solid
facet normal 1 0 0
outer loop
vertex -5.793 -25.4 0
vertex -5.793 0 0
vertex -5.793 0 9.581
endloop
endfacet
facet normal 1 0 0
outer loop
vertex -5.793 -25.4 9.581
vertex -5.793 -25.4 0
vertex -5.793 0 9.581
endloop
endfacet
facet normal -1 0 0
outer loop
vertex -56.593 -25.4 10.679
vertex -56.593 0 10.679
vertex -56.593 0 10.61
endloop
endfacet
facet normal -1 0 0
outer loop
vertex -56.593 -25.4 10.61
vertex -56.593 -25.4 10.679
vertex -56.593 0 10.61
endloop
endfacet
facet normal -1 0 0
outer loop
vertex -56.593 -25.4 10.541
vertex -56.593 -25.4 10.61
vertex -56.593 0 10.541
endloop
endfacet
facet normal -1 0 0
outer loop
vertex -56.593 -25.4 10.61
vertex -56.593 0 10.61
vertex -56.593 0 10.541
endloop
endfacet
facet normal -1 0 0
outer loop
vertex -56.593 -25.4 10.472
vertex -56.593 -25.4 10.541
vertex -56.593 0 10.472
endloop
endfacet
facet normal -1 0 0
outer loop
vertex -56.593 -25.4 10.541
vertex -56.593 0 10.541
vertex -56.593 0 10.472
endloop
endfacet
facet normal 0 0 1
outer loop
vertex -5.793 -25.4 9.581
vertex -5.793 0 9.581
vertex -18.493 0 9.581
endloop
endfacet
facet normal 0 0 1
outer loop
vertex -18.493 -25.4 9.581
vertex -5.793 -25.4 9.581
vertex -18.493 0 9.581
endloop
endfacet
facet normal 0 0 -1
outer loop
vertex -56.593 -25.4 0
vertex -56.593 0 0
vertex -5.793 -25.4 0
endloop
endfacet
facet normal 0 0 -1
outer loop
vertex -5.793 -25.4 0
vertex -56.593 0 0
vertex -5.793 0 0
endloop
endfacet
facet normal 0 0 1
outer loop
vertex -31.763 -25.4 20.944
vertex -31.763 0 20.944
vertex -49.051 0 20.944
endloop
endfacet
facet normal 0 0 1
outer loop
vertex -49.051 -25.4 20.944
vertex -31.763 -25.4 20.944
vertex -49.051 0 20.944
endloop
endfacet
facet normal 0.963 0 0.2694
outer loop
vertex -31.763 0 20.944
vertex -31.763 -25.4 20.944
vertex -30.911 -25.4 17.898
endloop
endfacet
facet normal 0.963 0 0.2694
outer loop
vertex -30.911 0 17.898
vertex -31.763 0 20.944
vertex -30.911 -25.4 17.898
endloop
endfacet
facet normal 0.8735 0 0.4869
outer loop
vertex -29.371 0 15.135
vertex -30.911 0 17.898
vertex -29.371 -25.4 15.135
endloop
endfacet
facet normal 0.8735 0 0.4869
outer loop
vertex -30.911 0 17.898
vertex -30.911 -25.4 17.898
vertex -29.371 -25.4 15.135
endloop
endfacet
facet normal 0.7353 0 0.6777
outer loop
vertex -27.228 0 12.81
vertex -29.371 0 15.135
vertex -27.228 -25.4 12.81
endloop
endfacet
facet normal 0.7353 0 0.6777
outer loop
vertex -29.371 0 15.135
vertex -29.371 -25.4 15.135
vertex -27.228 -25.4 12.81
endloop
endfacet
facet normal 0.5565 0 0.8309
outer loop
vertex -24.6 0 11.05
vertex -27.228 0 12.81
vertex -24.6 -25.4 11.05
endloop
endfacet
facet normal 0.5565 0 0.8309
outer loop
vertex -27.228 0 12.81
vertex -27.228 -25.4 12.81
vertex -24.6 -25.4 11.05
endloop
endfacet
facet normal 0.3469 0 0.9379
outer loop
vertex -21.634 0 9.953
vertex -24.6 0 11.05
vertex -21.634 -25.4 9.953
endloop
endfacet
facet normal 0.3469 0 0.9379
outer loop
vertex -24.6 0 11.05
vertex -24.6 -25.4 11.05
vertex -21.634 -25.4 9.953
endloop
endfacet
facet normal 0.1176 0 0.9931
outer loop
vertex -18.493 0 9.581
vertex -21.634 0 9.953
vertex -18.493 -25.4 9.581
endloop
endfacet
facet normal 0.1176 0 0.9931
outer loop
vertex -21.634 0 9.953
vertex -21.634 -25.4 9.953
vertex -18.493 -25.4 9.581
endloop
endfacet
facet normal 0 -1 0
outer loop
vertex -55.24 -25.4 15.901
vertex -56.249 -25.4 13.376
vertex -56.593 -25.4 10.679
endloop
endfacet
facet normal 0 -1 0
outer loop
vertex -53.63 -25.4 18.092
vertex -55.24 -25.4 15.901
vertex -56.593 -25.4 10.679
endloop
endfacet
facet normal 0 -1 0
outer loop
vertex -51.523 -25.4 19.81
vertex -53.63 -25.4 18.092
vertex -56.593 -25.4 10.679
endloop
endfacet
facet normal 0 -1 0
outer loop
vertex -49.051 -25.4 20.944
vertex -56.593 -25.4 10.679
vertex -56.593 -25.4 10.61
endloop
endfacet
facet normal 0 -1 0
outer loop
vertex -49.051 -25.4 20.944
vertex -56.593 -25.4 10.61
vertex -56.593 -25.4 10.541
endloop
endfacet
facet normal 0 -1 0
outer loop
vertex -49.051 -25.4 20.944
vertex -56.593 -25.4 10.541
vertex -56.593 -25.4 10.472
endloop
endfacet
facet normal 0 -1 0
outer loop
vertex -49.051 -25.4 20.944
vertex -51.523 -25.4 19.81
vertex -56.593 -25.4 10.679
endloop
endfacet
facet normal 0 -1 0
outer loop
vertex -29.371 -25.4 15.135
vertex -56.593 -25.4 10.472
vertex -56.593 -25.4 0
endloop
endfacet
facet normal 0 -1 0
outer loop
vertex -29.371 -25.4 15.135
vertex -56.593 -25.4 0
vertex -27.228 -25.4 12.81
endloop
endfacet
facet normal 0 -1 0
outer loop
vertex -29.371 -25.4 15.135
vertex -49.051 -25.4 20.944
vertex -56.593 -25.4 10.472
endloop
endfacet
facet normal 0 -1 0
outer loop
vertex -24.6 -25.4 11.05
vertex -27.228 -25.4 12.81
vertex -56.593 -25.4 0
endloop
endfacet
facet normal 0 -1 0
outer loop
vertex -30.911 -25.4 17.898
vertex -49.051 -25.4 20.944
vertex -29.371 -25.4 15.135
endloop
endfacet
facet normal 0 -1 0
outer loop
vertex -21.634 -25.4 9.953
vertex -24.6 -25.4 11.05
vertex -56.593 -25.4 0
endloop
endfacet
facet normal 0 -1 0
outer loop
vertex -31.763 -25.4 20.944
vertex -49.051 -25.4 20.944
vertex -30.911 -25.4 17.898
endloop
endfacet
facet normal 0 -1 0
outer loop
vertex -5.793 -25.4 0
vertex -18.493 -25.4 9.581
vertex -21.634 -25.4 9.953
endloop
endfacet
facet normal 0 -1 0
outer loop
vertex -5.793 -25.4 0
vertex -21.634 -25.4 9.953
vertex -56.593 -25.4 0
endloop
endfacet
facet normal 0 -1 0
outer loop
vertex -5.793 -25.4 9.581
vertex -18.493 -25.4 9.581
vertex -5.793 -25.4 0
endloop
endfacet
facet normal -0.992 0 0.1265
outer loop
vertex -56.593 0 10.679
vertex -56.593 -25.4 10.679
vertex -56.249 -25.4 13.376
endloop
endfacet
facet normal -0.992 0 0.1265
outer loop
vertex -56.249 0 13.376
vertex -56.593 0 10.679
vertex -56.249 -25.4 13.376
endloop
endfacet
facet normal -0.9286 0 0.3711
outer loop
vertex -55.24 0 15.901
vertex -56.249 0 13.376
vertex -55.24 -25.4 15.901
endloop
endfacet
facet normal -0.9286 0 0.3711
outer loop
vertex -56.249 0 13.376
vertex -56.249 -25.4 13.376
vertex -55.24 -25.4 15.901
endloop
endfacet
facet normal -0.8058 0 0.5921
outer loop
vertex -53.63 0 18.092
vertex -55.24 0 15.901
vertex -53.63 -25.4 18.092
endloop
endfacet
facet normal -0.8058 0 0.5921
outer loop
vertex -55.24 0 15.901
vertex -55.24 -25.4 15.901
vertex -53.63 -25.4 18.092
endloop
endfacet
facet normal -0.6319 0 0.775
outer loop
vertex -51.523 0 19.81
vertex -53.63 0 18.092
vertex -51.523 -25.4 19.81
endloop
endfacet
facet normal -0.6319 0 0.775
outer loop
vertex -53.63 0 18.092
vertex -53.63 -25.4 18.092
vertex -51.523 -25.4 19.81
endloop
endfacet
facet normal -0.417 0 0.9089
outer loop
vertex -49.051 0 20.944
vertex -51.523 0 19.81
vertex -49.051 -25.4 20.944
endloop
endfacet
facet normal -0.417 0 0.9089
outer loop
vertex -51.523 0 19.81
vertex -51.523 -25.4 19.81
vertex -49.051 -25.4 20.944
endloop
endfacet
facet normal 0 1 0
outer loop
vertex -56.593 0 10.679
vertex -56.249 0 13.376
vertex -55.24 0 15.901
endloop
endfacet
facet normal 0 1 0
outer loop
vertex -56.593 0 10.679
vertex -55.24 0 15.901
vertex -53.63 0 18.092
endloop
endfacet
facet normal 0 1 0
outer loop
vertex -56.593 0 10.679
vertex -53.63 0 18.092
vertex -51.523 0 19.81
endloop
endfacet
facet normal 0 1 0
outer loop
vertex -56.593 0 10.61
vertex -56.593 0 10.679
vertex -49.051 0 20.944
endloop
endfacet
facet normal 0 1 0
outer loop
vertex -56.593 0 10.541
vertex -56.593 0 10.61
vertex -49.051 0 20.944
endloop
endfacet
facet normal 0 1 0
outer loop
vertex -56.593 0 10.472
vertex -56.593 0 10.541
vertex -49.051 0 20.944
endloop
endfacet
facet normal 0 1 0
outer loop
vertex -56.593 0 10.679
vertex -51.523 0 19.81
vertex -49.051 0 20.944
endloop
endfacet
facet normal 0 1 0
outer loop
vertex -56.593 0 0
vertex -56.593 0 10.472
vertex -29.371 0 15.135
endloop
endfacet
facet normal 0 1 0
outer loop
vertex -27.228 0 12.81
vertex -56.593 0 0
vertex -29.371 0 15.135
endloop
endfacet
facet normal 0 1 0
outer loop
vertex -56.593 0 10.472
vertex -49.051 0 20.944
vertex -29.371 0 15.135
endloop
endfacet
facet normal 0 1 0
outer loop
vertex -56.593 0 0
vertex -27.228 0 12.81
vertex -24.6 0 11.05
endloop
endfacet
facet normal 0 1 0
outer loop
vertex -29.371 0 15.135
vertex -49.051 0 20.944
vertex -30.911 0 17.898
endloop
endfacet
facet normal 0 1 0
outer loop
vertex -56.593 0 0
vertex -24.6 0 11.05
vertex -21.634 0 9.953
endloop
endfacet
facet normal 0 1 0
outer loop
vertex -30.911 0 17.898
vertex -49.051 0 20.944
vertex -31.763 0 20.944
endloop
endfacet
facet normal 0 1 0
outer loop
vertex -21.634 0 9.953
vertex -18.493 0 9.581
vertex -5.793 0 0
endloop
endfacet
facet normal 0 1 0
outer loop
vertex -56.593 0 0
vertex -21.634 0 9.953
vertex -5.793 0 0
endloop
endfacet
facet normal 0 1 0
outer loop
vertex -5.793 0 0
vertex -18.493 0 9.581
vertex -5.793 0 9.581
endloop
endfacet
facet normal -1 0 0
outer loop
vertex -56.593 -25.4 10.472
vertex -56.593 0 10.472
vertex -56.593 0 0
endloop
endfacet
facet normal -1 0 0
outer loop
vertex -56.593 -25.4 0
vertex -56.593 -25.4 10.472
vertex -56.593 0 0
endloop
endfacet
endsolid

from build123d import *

# Parameters (mm, degrees)
F1_DEPTH = 25.4
F3_DEPTH = 25.4


with BuildPart() as f1:
    # F0 (on Front) → F1 (new body)
    with BuildSketch(Plane.XZ):
        with BuildLine():
            Line((-56.592982, 10.47193), (-56.592982, 0))
            Line((-56.592982, 0), (-5.792982, 0))
            Line((-5.792982, 0), (-5.792982, 9.580702))
            Line((-5.792982, 9.580702), (-18.492982, 9.580702))
            ThreePointArc((-18.492982, 9.580702), (-27.683477, 12.761842), (-32.940801, 20.943859))
            Line((-32.940801, 20.943859), (-50.7854, 20.943859))
            ThreePointArc((-50.7854, 20.943859), (-55.017084, 16.562817), (-56.592982, 10.679176))
            Line((-56.592982, 10.679176), (-56.592982, 10.47193))
        make_face()
        with BuildLine():
            ThreePointArc((-56.592982, 10.679176), (-56.593423, 10.575553), (-56.592982, 10.47193))
            Line((-56.592982, 10.47193), (-56.592982, 10.679176))
        make_face()
        with BuildLine():
            Line((-56.592982, 20.943859), (-56.592982, 10.679176))
            ThreePointArc((-56.592982, 10.679176), (-55.017084, 16.562817), (-50.7854, 20.943859))
            Line((-50.7854, 20.943859), (-56.592982, 20.943859))
        make_face()
        with BuildLine():
            ThreePointArc((-32.940801, 20.943859), (-27.683477, 12.761842), (-18.492982, 9.580702))
            Line((-18.492982, 9.580702), (-18.492982, 20.943859))
            Line((-18.492982, 20.943859), (-32.940801, 20.943859))
        make_face()
    extrude(amount=F1_DEPTH)

    # F2 (on face) → F3 (cut)
    with BuildSketch(Plane.XZ.offset(25.4)):
        with BuildLine():
            ThreePointArc((-56.592982, 10.679176), (-54.5049, 17.047845), (-49.051359, 20.943859))
            Line((-49.051359, 20.943859), (-56.592982, 20.943859))
            Line((-56.592982, 20.943859), (-56.592982, 10.679176))
        make_face()
        with BuildLine():
            Line((-18.492982, 20.943859), (-31.762764, 20.943859))
            ThreePointArc((-31.762764, 20.943859), (-27.22809, 12.809668), (-18.492982, 9.580702))
            Line((-18.492982, 9.580702), (-18.492982, 20.943859))
        make_face()
    extrude(amount=-F3_DEPTH, mode=Mode.SUBTRACT)


solid = f1.part
